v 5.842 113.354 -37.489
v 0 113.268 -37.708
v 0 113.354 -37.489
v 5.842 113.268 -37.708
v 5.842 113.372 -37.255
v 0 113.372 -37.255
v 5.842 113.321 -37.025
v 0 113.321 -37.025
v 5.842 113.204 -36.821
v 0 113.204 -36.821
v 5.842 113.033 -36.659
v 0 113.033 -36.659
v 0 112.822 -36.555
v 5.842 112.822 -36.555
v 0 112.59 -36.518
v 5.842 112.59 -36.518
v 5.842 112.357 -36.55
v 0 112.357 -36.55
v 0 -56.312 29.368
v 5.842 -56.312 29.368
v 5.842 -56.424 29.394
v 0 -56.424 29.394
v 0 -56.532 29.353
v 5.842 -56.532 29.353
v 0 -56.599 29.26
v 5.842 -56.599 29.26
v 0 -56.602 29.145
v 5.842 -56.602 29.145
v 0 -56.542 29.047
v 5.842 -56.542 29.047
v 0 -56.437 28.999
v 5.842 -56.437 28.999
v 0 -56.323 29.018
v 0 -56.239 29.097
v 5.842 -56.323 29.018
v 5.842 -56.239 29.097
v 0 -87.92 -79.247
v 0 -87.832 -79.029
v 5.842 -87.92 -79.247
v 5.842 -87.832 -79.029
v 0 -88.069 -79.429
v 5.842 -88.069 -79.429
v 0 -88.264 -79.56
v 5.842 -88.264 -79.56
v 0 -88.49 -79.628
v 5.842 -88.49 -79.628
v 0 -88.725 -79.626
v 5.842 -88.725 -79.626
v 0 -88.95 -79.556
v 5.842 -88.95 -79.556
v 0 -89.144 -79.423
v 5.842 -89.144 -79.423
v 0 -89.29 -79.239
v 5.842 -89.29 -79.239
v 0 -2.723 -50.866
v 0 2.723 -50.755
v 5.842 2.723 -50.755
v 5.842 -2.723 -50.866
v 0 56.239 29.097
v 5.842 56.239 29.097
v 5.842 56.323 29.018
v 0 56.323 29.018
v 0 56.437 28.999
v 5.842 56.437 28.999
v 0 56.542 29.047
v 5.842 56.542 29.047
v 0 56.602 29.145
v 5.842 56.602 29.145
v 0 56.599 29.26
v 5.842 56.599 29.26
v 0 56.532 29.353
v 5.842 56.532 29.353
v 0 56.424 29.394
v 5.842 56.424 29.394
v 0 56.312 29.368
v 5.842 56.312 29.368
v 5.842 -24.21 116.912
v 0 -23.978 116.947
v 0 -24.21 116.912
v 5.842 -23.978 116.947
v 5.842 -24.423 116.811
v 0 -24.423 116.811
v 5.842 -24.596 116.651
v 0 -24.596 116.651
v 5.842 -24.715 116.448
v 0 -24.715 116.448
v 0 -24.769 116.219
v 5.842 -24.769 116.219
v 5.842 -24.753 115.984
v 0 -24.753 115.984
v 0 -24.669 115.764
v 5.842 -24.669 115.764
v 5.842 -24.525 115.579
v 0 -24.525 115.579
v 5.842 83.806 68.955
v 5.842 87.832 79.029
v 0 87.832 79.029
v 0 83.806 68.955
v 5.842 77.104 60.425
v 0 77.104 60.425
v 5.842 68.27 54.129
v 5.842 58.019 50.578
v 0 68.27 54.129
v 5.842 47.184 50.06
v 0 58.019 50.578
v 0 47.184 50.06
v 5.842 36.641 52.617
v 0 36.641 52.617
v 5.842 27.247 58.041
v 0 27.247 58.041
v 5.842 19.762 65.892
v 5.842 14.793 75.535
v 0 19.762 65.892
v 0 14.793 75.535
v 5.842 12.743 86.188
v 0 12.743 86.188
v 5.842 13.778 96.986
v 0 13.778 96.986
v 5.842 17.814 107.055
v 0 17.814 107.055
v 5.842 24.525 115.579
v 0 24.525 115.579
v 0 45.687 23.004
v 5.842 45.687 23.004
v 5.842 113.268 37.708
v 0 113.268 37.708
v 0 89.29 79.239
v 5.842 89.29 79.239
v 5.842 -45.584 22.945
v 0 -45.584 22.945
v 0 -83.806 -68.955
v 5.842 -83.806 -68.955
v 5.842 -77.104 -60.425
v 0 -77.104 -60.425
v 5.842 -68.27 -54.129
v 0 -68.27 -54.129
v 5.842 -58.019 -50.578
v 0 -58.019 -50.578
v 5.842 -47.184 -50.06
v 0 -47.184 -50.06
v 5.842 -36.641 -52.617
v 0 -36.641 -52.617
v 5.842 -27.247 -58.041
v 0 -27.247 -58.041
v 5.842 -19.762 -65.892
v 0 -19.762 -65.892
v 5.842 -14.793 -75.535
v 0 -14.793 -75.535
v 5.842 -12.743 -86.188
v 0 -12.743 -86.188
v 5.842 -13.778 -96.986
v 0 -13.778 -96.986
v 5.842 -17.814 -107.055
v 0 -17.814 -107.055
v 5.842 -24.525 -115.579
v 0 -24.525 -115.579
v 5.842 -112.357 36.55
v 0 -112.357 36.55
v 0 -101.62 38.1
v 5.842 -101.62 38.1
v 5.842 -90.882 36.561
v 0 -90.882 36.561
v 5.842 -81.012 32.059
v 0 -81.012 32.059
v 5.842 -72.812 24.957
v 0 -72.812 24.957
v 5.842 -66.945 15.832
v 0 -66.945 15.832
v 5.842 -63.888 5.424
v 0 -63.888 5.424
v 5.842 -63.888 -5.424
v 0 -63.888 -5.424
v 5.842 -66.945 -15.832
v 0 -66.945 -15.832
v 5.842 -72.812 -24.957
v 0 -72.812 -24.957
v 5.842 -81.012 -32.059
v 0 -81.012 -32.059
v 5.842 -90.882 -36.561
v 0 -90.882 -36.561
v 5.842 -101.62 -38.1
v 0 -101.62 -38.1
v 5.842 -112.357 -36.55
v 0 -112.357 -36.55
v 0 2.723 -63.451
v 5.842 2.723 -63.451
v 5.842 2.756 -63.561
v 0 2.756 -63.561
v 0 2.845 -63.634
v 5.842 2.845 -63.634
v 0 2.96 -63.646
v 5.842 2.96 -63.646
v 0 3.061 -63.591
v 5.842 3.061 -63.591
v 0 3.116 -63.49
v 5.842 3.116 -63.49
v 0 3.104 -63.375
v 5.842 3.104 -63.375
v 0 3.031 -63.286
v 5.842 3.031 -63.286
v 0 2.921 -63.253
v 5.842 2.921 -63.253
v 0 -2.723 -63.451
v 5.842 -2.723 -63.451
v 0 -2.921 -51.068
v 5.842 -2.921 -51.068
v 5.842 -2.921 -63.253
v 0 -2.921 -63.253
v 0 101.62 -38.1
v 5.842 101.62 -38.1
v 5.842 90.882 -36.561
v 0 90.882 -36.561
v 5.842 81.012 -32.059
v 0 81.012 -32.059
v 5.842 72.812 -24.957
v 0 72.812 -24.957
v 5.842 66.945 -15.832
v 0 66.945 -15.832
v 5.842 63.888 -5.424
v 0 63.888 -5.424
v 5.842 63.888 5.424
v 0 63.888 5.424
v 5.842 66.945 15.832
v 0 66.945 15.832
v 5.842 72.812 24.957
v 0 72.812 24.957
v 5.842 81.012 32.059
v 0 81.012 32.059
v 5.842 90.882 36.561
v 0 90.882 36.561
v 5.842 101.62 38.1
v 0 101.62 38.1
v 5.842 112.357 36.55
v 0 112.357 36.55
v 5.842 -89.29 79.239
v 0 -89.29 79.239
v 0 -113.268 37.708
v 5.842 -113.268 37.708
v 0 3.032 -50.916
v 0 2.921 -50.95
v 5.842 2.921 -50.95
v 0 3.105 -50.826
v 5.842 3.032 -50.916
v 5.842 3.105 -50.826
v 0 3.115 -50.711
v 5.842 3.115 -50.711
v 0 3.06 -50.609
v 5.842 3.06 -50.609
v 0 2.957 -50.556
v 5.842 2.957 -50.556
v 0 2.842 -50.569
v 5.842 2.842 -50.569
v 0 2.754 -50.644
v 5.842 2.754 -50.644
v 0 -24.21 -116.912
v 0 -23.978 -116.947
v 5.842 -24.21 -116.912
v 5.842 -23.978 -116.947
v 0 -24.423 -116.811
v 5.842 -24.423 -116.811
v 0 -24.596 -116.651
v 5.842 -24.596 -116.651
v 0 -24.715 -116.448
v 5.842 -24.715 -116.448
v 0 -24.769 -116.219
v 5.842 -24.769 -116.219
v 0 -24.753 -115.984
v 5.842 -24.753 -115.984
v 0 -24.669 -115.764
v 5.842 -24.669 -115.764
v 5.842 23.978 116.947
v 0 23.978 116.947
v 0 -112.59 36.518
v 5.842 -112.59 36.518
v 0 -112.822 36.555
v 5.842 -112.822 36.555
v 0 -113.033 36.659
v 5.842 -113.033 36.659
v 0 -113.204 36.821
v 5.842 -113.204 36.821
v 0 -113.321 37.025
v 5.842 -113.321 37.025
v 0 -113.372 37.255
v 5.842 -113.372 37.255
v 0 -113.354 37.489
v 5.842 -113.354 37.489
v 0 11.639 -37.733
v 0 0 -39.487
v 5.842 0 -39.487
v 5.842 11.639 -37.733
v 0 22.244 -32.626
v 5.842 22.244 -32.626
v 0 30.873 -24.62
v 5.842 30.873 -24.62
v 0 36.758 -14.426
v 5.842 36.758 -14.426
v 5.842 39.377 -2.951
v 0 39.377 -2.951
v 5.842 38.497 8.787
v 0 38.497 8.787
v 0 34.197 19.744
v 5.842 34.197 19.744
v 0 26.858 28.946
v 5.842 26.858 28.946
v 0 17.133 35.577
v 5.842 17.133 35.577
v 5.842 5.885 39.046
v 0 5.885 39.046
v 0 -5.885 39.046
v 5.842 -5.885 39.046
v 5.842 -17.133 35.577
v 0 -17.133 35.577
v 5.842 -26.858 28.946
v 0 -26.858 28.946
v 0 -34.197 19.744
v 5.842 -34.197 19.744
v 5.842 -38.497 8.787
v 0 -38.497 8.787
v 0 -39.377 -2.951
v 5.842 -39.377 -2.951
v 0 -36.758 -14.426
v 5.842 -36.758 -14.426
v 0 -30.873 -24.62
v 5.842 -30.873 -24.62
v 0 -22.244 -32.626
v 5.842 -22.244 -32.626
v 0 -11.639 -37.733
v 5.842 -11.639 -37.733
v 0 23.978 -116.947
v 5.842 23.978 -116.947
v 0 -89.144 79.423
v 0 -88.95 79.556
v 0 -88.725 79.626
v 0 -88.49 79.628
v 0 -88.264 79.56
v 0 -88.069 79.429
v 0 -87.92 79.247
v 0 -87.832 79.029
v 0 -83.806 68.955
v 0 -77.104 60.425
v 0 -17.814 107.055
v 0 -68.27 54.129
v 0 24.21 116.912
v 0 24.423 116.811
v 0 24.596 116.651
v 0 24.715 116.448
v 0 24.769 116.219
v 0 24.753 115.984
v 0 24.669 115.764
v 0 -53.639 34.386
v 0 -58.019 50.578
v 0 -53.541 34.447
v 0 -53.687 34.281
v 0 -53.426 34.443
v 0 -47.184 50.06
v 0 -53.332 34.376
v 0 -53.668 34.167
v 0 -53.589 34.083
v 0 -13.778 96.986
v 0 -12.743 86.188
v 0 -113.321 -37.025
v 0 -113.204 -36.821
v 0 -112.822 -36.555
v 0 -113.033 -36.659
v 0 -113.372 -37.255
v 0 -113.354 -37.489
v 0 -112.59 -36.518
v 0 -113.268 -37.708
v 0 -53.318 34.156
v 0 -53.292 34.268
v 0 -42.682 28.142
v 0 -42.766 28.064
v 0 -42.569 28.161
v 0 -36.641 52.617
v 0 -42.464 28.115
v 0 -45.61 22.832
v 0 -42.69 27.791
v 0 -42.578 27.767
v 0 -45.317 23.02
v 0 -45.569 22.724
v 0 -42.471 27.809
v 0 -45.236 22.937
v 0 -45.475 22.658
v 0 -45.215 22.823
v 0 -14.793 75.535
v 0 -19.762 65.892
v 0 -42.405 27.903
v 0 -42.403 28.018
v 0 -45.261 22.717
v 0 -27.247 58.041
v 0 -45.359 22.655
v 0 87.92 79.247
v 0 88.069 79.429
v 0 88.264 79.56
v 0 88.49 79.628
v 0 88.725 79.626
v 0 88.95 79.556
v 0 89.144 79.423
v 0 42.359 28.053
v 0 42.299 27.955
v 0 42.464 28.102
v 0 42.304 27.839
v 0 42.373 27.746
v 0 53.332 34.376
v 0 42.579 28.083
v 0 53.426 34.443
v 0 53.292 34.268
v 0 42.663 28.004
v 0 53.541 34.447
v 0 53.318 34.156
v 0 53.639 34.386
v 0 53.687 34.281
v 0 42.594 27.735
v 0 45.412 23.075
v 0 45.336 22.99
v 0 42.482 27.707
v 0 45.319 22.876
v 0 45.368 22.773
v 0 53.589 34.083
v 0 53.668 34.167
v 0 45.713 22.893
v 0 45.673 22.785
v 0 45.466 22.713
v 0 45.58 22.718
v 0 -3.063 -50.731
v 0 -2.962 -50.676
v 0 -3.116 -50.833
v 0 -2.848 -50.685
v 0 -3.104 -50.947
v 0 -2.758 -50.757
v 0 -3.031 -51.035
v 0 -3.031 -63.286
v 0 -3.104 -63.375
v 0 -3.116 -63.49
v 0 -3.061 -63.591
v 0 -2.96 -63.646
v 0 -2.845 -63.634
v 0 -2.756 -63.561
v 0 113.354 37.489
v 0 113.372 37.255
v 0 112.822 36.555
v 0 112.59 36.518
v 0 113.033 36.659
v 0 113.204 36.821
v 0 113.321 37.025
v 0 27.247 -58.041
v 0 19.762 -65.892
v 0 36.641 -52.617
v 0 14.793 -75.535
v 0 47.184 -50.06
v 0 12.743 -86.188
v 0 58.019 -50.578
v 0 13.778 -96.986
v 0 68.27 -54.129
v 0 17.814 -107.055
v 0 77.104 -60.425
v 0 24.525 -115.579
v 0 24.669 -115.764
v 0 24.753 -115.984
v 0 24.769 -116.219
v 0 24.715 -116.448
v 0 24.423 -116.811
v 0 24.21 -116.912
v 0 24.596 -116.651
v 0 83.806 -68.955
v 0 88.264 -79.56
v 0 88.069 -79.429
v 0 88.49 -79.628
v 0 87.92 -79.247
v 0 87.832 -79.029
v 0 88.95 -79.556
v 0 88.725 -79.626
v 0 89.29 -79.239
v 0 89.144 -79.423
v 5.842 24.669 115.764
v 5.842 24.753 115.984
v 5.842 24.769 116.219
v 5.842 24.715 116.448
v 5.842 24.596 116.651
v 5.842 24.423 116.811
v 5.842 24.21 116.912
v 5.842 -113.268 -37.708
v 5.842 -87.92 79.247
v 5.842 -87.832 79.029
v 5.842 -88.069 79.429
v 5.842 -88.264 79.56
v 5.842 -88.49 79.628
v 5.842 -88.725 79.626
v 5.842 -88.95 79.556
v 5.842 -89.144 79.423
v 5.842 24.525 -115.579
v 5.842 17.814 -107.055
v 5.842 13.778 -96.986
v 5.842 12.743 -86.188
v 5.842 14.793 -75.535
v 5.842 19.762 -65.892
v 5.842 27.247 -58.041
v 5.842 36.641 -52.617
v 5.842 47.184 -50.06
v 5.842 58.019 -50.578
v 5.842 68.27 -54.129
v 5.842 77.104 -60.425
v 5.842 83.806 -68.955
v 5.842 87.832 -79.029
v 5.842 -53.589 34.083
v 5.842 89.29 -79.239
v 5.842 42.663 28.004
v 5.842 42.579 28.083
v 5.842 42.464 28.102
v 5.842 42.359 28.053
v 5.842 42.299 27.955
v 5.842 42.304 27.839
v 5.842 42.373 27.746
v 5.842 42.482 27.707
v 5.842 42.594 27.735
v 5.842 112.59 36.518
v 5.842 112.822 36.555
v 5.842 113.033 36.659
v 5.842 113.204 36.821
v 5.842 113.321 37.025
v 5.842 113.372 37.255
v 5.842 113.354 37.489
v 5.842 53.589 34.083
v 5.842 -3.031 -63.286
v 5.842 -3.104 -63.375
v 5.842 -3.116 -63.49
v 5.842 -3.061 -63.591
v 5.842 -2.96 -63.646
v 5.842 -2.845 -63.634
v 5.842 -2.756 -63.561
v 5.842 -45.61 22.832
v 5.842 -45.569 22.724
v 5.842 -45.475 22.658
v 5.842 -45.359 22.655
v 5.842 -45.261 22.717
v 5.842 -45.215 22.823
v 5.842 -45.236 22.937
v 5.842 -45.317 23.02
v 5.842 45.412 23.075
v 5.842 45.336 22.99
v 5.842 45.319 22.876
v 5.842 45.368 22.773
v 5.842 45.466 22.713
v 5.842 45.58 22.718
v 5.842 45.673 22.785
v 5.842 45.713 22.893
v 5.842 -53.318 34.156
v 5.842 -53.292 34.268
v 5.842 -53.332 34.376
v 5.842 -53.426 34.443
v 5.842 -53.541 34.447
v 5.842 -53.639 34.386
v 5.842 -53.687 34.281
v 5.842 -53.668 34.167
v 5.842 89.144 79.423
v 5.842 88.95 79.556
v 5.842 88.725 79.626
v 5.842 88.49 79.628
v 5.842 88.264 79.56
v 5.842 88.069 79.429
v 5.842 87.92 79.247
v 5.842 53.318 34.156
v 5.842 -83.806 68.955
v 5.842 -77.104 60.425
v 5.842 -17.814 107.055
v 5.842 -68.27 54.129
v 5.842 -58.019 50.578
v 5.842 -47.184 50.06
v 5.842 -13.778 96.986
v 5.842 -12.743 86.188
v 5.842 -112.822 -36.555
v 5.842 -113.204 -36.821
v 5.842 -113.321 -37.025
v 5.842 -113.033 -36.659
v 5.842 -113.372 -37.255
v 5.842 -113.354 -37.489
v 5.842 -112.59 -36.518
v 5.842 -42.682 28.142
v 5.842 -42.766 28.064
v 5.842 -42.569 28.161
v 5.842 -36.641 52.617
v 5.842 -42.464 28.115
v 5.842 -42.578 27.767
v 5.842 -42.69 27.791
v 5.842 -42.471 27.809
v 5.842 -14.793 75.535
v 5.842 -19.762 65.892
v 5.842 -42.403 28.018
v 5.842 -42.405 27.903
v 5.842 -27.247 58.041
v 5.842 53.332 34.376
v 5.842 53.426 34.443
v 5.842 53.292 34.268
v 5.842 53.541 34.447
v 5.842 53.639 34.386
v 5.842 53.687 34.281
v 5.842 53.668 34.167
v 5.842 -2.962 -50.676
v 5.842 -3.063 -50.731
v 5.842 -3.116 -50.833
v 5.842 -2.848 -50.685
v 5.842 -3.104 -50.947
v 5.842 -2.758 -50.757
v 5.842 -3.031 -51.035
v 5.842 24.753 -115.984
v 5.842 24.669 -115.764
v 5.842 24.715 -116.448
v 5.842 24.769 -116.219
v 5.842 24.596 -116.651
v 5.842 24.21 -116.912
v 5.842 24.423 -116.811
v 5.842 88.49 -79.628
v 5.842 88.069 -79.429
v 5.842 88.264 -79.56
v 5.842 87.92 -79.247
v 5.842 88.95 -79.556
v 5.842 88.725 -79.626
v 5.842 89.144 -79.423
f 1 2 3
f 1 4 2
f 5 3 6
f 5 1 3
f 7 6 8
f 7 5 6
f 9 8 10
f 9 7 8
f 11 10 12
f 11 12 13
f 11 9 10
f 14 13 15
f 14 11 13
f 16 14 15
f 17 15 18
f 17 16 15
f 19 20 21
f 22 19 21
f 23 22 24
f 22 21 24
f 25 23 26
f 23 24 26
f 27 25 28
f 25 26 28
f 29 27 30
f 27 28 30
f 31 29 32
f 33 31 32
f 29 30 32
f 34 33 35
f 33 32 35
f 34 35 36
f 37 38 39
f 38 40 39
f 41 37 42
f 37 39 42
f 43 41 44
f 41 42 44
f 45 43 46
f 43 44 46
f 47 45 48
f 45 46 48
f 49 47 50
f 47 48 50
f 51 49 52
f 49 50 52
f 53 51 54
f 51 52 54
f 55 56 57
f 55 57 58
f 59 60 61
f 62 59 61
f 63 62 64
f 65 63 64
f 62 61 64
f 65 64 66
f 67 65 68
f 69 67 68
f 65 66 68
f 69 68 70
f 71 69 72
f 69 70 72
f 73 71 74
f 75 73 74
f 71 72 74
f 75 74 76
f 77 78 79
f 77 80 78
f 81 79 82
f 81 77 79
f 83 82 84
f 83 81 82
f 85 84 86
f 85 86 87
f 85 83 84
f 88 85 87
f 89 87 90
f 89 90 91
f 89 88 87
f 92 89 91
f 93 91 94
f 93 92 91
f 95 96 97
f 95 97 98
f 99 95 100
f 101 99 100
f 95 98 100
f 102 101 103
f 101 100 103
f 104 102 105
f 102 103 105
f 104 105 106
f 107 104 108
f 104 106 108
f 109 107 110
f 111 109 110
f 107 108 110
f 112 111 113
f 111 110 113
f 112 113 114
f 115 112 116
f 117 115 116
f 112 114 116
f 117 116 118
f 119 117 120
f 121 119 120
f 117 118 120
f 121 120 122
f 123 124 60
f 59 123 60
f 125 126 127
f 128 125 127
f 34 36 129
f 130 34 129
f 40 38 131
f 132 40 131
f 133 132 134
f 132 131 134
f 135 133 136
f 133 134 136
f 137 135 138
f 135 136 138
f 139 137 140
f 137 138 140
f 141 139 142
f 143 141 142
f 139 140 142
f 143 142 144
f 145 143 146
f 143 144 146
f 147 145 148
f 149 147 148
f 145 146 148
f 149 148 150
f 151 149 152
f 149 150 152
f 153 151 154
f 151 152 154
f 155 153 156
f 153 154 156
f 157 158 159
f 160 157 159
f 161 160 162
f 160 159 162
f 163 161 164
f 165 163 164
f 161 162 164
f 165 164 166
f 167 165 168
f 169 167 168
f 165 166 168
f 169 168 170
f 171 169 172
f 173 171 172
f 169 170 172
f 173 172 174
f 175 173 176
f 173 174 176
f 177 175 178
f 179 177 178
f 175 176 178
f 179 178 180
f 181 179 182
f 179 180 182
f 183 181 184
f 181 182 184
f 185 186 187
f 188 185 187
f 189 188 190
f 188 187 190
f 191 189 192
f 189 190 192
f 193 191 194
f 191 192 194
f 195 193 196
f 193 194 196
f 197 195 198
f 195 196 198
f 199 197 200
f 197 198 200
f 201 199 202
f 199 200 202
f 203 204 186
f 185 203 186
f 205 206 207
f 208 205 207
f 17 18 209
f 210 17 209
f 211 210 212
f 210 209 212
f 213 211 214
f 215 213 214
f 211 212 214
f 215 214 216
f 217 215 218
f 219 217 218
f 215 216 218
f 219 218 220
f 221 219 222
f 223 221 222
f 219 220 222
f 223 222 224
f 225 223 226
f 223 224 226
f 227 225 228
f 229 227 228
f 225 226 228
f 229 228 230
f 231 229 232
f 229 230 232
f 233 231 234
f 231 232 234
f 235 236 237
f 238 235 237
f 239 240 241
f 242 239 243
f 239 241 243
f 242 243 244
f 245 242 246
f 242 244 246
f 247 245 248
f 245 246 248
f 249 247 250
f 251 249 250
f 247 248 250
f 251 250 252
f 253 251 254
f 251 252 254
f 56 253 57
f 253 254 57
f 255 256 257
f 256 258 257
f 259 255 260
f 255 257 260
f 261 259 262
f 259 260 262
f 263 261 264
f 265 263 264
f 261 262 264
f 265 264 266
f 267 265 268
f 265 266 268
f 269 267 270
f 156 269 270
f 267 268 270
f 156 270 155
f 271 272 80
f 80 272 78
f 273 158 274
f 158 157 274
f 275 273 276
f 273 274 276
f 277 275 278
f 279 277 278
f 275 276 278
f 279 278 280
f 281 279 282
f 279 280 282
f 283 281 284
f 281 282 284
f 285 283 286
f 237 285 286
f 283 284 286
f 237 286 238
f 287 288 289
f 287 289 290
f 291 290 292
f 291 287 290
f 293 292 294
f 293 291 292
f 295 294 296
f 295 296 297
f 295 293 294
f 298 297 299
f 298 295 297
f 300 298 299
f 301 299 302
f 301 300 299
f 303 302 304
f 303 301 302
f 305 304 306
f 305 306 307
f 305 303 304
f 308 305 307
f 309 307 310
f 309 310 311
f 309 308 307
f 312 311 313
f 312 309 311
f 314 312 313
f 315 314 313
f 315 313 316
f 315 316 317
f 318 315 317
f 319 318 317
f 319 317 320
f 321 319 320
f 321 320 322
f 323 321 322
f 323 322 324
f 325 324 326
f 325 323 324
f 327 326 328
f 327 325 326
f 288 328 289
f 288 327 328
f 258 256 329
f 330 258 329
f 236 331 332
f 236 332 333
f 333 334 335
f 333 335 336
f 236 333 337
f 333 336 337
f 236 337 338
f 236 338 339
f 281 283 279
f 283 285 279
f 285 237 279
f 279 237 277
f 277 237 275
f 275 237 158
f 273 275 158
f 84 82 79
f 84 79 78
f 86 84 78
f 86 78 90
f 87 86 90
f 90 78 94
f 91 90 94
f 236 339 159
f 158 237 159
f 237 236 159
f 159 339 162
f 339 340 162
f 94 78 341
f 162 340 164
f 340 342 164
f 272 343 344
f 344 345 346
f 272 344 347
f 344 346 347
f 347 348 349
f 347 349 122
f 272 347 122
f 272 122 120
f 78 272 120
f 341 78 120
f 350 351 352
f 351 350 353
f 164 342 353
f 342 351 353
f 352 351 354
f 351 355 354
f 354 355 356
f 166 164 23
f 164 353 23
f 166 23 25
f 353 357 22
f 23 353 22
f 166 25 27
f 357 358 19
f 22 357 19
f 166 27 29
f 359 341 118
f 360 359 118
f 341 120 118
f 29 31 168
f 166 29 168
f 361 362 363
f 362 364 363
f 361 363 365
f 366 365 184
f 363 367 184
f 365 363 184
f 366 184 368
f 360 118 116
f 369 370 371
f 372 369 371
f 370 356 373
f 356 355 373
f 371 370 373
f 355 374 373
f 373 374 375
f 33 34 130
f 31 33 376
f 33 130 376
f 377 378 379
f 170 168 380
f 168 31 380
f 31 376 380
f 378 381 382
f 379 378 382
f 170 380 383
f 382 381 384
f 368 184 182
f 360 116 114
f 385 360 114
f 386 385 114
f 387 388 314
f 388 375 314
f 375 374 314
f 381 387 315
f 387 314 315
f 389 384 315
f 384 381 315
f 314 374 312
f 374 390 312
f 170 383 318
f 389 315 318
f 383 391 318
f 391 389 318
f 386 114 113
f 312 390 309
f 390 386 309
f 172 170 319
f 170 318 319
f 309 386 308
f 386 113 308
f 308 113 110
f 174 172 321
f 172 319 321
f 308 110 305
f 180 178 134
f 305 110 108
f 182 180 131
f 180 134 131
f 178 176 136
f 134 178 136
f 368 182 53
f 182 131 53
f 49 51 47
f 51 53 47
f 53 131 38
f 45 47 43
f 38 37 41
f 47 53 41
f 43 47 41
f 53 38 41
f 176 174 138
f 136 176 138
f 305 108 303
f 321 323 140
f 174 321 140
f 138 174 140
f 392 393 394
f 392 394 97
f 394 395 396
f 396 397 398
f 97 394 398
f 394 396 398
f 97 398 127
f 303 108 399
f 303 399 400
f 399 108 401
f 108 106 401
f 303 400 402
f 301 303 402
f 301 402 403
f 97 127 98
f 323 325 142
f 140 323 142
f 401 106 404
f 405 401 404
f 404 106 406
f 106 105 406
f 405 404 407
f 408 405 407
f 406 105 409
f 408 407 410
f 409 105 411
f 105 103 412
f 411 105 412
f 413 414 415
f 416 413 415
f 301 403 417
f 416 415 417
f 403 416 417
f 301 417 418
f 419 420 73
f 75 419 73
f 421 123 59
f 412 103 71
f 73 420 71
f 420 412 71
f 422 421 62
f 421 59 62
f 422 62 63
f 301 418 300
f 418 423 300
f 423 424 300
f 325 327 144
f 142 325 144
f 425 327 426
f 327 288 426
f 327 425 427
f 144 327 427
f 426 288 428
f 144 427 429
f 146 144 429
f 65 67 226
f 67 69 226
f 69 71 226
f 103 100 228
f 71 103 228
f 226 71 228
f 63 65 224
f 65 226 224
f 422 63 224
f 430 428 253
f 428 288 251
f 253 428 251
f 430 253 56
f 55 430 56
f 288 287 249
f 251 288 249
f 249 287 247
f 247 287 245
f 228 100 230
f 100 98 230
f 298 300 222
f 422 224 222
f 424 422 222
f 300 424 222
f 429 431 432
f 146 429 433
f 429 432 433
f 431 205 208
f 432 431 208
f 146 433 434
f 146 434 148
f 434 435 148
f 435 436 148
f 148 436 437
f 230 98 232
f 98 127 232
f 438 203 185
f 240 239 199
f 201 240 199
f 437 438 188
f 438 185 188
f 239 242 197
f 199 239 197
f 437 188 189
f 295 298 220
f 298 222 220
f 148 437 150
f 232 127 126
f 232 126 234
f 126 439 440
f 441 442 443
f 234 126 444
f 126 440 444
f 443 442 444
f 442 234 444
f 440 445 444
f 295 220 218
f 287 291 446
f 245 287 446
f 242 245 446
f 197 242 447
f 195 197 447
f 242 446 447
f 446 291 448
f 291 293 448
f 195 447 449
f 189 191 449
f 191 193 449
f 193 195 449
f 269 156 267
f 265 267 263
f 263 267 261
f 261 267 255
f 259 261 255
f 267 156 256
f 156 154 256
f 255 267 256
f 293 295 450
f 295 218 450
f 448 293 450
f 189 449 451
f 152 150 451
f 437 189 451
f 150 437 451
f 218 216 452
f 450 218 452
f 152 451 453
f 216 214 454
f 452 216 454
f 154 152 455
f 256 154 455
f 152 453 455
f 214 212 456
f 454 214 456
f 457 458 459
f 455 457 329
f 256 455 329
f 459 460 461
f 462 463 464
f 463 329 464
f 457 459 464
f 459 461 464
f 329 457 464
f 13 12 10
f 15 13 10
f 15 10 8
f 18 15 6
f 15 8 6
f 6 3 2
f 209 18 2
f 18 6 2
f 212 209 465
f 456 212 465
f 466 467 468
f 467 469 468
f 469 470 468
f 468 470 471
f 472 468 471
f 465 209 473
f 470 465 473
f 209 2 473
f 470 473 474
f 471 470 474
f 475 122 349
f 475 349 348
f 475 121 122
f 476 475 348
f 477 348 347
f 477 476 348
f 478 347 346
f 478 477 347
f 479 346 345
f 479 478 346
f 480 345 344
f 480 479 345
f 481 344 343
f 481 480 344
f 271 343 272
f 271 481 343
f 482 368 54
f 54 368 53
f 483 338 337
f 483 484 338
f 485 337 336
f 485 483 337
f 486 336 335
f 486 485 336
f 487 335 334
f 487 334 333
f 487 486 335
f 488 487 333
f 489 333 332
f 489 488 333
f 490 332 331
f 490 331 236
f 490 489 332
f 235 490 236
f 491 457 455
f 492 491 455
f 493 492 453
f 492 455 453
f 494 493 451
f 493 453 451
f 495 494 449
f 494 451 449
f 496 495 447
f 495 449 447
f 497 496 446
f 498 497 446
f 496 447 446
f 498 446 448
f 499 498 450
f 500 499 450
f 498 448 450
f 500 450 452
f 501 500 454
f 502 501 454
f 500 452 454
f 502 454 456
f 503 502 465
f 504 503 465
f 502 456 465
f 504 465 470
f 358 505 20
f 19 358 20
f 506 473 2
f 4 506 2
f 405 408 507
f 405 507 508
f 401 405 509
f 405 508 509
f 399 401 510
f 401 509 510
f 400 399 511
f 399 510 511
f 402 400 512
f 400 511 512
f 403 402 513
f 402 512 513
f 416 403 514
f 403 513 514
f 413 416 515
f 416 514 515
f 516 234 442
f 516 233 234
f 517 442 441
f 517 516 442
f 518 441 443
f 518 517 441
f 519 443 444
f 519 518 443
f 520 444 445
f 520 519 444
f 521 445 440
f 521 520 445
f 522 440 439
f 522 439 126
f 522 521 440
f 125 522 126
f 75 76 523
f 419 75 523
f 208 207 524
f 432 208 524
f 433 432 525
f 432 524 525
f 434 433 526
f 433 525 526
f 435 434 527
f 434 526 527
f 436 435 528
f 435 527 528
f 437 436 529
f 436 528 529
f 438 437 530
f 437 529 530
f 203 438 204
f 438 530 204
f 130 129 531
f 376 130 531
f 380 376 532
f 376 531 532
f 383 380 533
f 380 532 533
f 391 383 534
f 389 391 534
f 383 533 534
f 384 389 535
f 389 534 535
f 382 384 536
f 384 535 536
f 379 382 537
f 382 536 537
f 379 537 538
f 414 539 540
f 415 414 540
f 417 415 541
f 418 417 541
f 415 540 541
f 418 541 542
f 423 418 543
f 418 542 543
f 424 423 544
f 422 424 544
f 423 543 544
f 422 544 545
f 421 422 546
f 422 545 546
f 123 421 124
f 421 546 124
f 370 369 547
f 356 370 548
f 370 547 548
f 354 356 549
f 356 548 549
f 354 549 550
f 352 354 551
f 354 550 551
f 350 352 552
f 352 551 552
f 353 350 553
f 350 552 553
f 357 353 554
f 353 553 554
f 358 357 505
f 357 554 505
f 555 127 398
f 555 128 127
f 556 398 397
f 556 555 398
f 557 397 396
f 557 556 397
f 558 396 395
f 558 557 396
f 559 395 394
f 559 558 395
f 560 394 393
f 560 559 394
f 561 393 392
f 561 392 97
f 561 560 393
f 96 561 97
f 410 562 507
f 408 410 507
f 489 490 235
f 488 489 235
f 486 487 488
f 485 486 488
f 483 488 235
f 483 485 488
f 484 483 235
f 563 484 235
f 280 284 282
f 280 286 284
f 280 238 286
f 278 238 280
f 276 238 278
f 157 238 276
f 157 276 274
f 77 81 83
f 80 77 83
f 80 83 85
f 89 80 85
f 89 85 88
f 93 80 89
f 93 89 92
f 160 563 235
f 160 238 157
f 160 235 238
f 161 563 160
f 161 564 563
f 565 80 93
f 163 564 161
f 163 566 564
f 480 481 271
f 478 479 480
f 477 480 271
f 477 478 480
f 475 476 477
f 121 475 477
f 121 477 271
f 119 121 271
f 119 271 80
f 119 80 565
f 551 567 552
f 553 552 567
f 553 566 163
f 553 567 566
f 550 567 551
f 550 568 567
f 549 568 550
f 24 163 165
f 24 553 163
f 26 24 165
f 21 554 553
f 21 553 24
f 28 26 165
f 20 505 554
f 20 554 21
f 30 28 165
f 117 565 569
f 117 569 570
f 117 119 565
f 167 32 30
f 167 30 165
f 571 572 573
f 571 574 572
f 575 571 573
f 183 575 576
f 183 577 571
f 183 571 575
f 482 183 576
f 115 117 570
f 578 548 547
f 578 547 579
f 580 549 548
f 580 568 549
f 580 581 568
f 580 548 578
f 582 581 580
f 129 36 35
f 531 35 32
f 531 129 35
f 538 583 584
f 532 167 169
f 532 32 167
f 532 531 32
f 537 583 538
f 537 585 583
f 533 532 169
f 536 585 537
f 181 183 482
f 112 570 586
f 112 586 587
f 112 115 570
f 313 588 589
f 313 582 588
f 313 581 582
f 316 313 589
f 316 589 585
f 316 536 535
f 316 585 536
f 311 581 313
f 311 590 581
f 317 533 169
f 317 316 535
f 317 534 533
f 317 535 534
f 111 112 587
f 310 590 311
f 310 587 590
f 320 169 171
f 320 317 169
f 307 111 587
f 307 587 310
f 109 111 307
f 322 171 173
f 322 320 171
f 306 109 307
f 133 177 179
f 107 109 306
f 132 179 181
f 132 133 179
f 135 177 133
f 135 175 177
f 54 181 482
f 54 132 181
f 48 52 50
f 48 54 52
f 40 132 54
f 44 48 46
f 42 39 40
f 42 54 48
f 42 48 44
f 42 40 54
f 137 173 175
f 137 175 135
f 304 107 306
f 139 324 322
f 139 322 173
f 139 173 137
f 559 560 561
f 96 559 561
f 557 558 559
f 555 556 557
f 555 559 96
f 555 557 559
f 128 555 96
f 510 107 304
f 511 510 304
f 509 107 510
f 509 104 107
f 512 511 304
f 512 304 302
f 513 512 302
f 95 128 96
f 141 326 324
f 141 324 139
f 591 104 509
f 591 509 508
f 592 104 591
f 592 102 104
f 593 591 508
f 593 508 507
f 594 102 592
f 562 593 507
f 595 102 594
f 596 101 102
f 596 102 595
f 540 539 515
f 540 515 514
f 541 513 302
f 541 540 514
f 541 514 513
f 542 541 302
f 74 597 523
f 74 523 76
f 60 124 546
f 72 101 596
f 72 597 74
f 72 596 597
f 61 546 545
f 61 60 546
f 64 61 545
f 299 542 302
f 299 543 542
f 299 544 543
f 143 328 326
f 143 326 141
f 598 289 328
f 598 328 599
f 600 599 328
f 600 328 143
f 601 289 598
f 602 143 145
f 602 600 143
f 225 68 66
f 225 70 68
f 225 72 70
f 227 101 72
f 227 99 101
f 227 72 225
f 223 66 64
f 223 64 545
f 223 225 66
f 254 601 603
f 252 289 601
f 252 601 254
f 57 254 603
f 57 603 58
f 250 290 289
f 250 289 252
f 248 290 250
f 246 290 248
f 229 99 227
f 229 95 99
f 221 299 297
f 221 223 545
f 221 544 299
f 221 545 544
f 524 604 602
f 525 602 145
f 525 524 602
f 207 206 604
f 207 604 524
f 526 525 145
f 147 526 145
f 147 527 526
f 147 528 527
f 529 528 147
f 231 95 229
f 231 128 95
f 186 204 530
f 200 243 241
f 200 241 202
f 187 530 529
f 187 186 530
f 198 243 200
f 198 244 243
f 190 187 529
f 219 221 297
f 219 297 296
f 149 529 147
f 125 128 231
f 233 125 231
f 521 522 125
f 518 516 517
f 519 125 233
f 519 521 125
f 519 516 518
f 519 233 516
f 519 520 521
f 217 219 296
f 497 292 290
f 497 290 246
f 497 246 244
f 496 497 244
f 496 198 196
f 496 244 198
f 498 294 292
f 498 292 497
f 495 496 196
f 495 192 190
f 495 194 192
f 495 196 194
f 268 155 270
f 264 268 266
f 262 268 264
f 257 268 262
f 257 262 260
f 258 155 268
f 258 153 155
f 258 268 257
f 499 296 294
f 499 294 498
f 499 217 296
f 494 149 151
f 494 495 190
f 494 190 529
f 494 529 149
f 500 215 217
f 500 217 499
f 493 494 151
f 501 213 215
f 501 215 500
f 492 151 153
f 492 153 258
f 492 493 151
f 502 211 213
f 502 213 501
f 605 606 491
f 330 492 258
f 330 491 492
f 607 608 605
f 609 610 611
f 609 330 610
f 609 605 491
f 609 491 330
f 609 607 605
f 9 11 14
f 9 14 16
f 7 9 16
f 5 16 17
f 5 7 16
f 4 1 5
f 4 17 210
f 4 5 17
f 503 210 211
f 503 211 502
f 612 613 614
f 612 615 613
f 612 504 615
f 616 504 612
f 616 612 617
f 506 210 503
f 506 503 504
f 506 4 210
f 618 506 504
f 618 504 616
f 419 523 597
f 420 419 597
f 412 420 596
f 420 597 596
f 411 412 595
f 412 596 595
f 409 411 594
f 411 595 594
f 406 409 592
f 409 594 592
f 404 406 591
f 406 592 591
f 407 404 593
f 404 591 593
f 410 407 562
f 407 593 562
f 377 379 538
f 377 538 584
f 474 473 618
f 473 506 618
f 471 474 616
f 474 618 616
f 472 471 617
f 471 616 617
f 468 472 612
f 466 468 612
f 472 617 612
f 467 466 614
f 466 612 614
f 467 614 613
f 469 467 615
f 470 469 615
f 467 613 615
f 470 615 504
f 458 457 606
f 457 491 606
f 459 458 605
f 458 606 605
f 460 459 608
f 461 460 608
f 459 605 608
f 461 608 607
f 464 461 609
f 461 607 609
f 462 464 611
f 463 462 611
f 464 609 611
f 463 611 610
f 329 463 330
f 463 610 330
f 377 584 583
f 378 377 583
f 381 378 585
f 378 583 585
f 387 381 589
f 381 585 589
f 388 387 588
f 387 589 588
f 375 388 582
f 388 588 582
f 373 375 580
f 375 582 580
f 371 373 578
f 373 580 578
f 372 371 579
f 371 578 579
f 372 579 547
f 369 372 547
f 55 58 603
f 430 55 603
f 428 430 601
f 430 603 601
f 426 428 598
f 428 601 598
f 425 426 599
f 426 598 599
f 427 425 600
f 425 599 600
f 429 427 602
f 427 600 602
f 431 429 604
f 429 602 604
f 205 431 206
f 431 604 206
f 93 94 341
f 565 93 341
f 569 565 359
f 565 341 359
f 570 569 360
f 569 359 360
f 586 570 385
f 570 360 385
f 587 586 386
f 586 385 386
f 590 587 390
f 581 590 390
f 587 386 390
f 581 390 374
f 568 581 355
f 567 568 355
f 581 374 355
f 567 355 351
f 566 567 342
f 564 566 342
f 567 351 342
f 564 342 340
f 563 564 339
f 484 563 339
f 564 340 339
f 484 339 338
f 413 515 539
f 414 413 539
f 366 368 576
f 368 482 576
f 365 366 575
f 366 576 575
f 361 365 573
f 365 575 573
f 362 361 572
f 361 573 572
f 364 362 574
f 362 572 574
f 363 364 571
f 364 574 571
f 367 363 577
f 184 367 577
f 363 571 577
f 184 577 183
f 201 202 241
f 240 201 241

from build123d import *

# Parameters (mm, degrees)
SKETCH2_R           = 39.487475
BOSS_EXTRUDE1_DEPTH = 5.842
FILLET1_R           = 0.79375
CUT_EXTRUDE2_DEPTH  = 163.986308211
CIRPATTERN2_COUNT   = 3


with BuildPart() as part:
    # Sketch2 → Boss-Extrude1 (new body)
    with BuildSketch(Plane(origin=(0, 0, 0), x_dir=(0, 0, -1), z_dir=(1, 0, 0))):
        with BuildLine():
            Line((81.02619141, 88.258519733), (35.921024484, 114.3))
            ThreePointArc((35.921024484, 114.3), (0, 63.5), (-35.921024484, 114.3))
            Line((-35.921024484, 114.3), (-81.02619141, 88.258519733))
            ThreePointArc((-81.02619141, 88.258519733), (-54.99261314, 31.75), (-116.947215895, 26.041480267))
            Line((-116.947215895, 26.041480267), (-116.947215895, -26.041480267))
            ThreePointArc((-116.947215895, -26.041480267), (-54.99261314, -31.75), (-81.02619141, -88.258519733))
            Line((-81.02619141, -88.258519733), (-35.921024484, -114.3))
            ThreePointArc((-35.921024484, -114.3), (0, -63.5), (35.921024484, -114.3))
            Line((35.921024484, -114.3), (81.02619141, -88.258519733))
            ThreePointArc((81.02619141, -88.258519733), (54.99261314, -31.75), (116.947215895, -26.041480267))
            Line((116.947215895, -26.041480267), (116.947215895, 26.041480267))
            ThreePointArc((116.947215895, 26.041480267), (54.99261314, 31.75), (81.02619141, 88.258519733))
        make_face()
        Circle(SKETCH2_R, mode=Mode.SUBTRACT)
    extrude(amount=BOSS_EXTRUDE1_DEPTH)

    # Fillet1
    fillet1_edges = [part.edges().sort_by_distance(p)[0] for p in [
        (2.921, 88.258519733, 81.02619141),
        (2.921, 114.3, 35.921024484),
        (2.921, 114.3, -35.921024484),
        (2.921, 88.258519733, -81.02619141),
        (2.921, 26.041480267, -116.947215895),
        (2.921, -26.041480267, -116.947215895),
        (2.921, -88.258519733, -81.02619141),
        (2.921, -114.3, -35.921024484),
        (2.921, -114.3, 35.921024484),
        (2.921, -88.258519733, 81.02619141),
        (2.921, -26.041480267, 116.947215895),
        (2.921, 26.041480267, 116.947215895),
    ]]
    fillet(fillet1_edges, radius=FILLET1_R)

    # Sketch6 → Cut-Extrude2 (cut, through all)
    with BuildSketch(Plane(origin=(5.842, 0, 0), x_dir=(0, 0, -1), z_dir=(1, 0, 0))):
        with BuildLine():
            Line((-23.004455913, 45.686886441), (-29.096698147, 56.238959523))
            ThreePointArc((-29.096698147, 56.238959523), (-29.144557493, 56.602487346), (-29.367768813, 56.311592689))
            Line((-29.367768813, 56.311592689), (-34.08338539, 53.589030189))
            ThreePointArc((-34.08338539, 53.589030189), (-34.446913212, 53.541170844), (-34.156018556, 53.317959523))
            Line((-34.156018556, 53.317959523), (-28.004456056, 42.663140727))
            ThreePointArc((-28.004456056, 42.663140727), (-27.954648068, 42.299101356), (-27.735435356, 42.593976392))
            Line((-27.735435356, 42.593976392), (-23.075039112, 45.412346944))
            ThreePointArc((-23.075039112, 45.412346944), (-22.713049707, 45.465623764), (-23.004455913, 45.686886441))
        make_face()
    cut_extrude2 = extrude(amount=-CUT_EXTRUDE2_DEPTH, mode=Mode.SUBTRACT)

    # CirPattern2: Cut-Extrude2 ×3 about axis
    cirpattern2_axis = Axis((0, 0, 0), (1, 0, 0))
    for i in range(1, CIRPATTERN2_COUNT):
        add(cut_extrude2.rotate(cirpattern2_axis, i * 360 / CIRPATTERN2_COUNT), mode=Mode.SUBTRACT)


solid = part.part
